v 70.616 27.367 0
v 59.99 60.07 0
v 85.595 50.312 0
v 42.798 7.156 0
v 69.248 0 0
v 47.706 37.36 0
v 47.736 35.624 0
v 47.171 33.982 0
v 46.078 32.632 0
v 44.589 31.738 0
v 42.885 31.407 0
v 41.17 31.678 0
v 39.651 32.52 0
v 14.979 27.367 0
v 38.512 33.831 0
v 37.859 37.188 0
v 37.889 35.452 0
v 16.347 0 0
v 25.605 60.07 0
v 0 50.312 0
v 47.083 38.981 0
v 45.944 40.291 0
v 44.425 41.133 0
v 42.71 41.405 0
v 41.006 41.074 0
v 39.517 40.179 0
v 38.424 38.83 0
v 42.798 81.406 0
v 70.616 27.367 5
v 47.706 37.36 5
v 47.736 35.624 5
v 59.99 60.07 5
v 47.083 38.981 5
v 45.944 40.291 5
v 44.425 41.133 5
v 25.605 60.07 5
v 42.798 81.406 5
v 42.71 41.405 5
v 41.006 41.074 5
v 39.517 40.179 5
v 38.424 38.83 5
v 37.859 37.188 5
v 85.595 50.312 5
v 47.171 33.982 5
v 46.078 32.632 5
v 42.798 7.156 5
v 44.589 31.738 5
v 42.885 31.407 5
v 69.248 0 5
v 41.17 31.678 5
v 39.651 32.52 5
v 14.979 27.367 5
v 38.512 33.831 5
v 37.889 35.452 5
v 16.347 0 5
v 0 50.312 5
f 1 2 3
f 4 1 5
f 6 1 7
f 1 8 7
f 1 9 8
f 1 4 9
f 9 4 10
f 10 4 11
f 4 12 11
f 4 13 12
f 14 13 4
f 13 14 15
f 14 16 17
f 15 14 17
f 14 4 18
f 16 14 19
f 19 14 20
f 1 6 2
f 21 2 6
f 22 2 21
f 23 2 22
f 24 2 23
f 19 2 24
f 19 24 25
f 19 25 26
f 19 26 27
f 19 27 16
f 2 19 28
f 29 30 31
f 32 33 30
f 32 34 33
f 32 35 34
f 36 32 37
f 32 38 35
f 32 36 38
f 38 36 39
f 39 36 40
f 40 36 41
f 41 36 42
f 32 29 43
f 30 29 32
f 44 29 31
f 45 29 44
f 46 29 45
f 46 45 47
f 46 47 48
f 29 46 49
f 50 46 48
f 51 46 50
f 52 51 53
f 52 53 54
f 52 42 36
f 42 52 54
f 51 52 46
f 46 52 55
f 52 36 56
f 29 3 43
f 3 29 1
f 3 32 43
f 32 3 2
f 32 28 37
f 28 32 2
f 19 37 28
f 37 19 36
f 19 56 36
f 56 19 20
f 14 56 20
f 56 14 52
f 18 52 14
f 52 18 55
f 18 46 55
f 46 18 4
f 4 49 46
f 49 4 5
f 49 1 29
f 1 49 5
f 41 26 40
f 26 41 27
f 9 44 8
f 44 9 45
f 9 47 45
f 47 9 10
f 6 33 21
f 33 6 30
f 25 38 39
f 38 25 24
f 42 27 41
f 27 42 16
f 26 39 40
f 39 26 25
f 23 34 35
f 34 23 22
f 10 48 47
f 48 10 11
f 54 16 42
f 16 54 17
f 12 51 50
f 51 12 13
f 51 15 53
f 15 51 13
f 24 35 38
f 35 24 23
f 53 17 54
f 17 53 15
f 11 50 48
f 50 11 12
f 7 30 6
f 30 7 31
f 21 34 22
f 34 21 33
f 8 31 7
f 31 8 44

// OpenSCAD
$fn = 32;

// ----------------------------------------------------------------------
// Star wheel: 5-point blunt, R45
// ----------------------------------------------------------------------

// --- parameters (mm) ---
n_points = 5;             // number of points / teeth
r_out = 45;               // tip radius
r_in = 29.25;             // root radius
bore_r = 5;               // centre bore radius
plate_t = 5;              // plate thickness, Z (extrusion height)
bore_d = 10;              // centre bore diameter
fit_tol = 0.05;           // declared fit tolerance (prompt contract)
free_tol = 0.3;           // declared free tolerance (prompt contract)

profile = [[42.798, 81.406], [25.605, 60.07], [0, 50.312], [14.979, 27.367], [16.347, 0], [42.798, 7.156], [69.248, 0], [70.616, 27.367], [85.595, 50.312], [59.99, 60.07]];  // primary outline, 10 points, counter clockwise
void_1 = [[47.706, 37.36], [47.083, 38.981], [45.944, 40.291], [44.425, 41.133], [42.71, 41.405], [41.006, 41.074], [39.517, 40.179], [38.424, 38.83], [37.859, 37.188], [37.889, 35.452], [38.512, 33.831], [39.651, 32.52], [41.17, 31.678], [42.885, 31.407], [44.589, 31.738], [46.078, 32.632], [47.171, 33.982], [47.736, 35.624]];  // centre bore, 18 points

// --- the one profile operation ---
difference() {
  linear_extrude(height = plate_t) polygon(points = profile);
  translate([0, 0, -1])
    linear_extrude(height = plate_t + 2) polygon(points = void_1);
}
